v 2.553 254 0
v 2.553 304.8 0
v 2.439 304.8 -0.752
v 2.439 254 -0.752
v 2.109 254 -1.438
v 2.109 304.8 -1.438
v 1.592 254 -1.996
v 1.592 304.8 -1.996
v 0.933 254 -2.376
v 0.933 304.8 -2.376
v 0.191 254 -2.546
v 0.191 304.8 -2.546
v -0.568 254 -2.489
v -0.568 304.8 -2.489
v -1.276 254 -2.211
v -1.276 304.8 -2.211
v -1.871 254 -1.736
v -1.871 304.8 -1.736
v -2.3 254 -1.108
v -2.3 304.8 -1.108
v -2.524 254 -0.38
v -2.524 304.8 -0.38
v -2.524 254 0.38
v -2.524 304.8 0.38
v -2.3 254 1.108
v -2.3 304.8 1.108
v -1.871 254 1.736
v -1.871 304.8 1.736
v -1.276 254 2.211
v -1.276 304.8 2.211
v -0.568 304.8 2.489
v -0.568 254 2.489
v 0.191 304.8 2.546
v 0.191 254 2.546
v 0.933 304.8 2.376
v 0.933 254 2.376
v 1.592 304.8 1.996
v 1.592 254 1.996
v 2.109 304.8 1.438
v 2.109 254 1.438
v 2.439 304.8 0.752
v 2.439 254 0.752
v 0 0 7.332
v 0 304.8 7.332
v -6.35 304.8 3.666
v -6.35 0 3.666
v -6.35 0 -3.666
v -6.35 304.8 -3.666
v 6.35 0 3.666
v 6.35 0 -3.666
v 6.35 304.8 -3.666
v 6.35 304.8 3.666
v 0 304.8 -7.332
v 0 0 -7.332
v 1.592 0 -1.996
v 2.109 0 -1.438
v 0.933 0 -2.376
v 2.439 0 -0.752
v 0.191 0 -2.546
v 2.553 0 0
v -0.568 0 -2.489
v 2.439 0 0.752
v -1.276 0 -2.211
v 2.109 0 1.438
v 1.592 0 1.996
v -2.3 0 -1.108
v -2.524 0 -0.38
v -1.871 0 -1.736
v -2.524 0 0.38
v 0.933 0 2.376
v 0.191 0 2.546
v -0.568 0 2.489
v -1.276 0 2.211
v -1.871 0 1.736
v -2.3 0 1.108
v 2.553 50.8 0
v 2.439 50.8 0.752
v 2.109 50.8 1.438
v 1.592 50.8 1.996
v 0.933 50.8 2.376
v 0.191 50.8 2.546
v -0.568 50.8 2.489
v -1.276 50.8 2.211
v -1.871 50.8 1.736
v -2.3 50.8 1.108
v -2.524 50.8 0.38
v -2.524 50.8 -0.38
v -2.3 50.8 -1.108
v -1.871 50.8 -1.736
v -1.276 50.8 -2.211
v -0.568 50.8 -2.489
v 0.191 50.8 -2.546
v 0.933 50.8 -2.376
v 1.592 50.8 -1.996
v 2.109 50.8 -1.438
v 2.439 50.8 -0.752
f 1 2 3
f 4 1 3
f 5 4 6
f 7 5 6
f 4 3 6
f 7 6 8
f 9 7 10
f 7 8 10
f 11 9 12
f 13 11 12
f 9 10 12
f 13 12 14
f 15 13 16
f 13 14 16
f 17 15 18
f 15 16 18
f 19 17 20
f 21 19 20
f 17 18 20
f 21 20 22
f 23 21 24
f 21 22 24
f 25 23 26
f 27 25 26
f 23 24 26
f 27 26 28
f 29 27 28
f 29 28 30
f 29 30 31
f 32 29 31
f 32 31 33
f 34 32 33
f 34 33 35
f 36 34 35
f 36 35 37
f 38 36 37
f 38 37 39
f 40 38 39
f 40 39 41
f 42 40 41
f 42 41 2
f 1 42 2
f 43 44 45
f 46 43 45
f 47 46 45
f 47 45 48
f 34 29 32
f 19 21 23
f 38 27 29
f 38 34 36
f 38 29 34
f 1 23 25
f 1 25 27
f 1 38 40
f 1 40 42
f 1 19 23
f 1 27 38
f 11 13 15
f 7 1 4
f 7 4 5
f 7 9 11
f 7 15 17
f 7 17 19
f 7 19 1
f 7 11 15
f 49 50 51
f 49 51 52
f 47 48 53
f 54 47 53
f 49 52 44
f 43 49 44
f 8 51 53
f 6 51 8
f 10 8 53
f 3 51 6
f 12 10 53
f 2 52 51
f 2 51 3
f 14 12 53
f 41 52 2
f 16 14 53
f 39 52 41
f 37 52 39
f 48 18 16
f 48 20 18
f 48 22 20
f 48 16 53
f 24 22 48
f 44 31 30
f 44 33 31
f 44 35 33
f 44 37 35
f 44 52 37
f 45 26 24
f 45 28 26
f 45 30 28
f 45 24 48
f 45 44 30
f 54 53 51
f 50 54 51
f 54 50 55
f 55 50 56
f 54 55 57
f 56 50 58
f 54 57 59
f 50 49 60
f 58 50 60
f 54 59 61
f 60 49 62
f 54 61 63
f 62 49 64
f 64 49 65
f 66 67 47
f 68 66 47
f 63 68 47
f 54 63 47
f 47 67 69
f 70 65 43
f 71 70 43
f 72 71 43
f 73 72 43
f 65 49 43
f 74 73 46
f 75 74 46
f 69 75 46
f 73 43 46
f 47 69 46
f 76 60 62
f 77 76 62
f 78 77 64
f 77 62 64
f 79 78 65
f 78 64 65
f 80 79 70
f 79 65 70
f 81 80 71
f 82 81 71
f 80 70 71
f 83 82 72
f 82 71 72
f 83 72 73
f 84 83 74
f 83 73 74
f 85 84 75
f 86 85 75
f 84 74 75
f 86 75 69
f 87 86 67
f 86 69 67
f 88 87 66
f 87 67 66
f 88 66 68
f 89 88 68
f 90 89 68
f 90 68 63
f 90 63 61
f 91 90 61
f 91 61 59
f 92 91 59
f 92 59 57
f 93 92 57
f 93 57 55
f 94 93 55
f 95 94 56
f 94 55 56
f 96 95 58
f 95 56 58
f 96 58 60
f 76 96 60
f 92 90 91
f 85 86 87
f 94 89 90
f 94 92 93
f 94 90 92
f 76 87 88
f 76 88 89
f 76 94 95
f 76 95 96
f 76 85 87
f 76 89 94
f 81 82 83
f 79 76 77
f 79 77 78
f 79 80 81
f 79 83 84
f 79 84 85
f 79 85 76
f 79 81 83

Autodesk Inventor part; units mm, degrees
ref_plane "YZ Plane" through (0, 0, 0) normal (1, 0, 0) x (0, 1, 0)
ref_plane "XZ Plane" through (0, 0, 0) normal (0, 1, 0) x (-1, 0, 0)
ref_plane "XY Plane" through (0, 0, 0) normal (0, 0, 1) x (1, 0, 0)
sketch "Sketch1" plane through (0, 0, 0) normal (0, 1, 0) x (-1, 0, 0)
  line L0 (6.35, 3.6662) -> (6.35, -3.6662)
  line L1 (6.35, -3.6662) -> (0, -7.3323)
  line L2 (0, -7.3323) -> (-6.35, -3.6662)
  line L3 (-6.35, -3.6662) -> (-6.35, 3.6662)
  line L4 (-6.35, 3.6662) -> (0, 7.3323)
  line L5 (0, 7.3323) -> (6.35, 3.6662)
  point P0 (0, 0)
  point P1 (0, 0)
  point P2 (-6.35, 0)
  point P3 (6.35, 0)
  dimension "d0" = 12.7
extrude "Extrusion1" add sketch "Sketch1" along normal blind 304.8
sketch "Sketch2" plane through (0, 304.8, 0) normal (0, 1, 0) x (1, 0, 0)
  circle A0 centre (0, 0) radius 2.5527
  dimension "d3" = 5.1054
extrude "Extrusion2" cut sketch "Sketch2" against normal blind 50.8
sketch "Sketch3" plane through (0, 0, 0) normal (0, -1, 0) x (1, 0, 0)
  circle A0 centre (0, 0) radius 2.5527
  dimension "d6" = 5.1054
extrude "Extrusion3" cut sketch "Sketch3" against normal blind 50.8
thread "Thread1" size "1/4-20 UNC" class "2B" standard "ANSI Unified Screw Threads" full length
properties part number "CORL_003_Shaft" material "Aluminum 6061"
